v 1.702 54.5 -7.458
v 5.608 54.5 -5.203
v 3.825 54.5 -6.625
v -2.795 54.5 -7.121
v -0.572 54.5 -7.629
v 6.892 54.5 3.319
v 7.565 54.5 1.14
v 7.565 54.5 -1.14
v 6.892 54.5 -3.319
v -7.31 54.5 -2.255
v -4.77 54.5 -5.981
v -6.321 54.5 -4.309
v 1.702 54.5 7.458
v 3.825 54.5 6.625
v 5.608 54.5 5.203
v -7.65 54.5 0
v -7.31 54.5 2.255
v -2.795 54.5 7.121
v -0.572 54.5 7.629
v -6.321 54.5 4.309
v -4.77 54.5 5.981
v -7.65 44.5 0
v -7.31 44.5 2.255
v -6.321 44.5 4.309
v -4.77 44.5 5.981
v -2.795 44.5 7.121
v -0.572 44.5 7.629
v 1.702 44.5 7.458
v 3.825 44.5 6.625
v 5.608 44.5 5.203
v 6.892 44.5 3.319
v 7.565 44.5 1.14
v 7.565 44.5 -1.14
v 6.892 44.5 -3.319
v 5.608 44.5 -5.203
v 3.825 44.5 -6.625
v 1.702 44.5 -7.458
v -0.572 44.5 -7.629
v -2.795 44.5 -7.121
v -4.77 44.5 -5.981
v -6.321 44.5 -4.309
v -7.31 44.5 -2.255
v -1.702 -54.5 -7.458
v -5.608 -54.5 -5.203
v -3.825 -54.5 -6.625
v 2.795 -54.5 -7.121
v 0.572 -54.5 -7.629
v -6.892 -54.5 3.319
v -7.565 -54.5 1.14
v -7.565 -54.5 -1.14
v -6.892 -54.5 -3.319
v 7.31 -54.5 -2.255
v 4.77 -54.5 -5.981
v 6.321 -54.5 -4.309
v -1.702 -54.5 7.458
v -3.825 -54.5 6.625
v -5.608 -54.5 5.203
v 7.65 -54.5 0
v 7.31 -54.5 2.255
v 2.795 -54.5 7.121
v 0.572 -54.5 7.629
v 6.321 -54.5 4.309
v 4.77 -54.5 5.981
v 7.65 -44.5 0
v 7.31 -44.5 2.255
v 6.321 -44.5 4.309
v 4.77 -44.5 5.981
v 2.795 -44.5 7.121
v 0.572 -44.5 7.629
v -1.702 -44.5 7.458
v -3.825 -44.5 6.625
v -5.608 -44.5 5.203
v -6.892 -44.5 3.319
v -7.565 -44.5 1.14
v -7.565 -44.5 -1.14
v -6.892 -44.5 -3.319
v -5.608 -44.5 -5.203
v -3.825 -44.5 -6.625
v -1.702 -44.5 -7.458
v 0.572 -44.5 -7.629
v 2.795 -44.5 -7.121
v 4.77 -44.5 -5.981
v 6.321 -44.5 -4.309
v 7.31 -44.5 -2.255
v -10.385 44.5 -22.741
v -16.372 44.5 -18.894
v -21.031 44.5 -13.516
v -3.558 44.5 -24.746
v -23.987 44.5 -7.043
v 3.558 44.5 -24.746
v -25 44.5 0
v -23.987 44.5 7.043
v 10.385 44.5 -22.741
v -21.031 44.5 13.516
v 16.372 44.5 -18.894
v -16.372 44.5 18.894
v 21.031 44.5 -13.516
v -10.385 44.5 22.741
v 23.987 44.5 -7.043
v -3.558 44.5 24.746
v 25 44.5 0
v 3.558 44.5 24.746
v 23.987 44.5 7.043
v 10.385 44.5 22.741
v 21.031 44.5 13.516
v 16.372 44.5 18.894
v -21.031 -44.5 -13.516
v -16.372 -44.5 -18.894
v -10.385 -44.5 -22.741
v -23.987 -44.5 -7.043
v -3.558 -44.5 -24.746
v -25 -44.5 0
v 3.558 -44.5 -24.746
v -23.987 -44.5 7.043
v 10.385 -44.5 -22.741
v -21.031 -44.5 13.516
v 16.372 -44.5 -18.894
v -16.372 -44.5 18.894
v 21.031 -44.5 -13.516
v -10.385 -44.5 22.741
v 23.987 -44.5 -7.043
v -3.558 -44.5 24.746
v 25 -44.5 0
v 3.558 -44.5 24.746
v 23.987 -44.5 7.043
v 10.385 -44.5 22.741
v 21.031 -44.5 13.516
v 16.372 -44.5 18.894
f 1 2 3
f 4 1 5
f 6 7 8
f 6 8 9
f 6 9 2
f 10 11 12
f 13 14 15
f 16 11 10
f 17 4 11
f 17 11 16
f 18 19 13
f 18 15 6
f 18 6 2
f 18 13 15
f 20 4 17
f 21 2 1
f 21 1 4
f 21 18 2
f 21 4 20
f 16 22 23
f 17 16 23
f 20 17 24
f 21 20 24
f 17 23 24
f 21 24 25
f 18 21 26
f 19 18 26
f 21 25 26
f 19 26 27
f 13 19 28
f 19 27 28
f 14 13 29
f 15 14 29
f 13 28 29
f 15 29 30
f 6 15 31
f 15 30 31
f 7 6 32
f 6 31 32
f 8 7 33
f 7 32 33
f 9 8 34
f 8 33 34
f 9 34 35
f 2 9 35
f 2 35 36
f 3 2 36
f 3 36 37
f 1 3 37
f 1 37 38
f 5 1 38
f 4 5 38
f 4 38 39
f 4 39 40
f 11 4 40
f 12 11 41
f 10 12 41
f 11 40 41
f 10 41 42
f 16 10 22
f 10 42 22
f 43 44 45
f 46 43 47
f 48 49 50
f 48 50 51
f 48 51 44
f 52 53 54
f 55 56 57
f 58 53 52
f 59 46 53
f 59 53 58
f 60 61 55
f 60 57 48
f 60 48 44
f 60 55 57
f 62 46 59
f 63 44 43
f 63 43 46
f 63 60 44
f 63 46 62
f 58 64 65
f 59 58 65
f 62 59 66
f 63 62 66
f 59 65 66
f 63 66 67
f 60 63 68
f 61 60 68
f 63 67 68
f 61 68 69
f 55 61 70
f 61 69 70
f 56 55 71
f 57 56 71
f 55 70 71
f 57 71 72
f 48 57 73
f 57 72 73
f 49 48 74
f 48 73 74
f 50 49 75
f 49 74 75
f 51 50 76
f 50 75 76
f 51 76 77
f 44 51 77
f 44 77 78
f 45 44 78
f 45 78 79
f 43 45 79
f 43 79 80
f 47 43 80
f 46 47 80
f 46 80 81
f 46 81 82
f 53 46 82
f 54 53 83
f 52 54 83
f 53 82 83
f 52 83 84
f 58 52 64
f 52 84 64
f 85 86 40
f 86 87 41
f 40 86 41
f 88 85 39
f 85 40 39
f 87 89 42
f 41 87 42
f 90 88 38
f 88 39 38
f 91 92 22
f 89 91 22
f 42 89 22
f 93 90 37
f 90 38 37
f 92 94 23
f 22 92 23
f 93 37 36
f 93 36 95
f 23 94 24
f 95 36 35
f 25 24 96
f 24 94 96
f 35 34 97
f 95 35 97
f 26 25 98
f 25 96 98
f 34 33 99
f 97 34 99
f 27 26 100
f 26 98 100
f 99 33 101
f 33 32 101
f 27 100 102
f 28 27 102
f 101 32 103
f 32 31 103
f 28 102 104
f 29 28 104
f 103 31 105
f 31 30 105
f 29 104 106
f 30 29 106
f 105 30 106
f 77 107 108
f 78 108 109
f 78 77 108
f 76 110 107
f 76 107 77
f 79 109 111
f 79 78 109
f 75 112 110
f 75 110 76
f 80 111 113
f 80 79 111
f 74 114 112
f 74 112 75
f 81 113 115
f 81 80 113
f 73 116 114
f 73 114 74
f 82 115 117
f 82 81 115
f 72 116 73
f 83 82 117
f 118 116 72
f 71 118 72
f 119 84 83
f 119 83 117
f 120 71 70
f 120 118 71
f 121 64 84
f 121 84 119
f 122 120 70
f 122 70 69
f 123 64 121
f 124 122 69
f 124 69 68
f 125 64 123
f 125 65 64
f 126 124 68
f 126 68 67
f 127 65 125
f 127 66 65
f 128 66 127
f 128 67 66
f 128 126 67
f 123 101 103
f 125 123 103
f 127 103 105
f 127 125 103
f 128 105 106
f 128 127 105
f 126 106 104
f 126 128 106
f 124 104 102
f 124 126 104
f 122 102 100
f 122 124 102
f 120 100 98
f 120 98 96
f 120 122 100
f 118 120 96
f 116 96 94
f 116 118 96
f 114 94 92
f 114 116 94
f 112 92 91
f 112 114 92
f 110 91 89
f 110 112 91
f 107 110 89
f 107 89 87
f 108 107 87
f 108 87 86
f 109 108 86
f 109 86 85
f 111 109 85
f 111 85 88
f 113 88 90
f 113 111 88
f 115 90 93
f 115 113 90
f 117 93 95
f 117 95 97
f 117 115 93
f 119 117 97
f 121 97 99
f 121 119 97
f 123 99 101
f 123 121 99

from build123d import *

# Parameters (mm, degrees)
F0_R     = 25
F1_DEPTH = 44.5
F2_R     = 7.65
F3_DEPTH = 10
F4_R     = 7.65
F5_DEPTH = 10


with BuildPart() as f1:
    # F0 (on Front) → F1 (new body, symmetric)
    with BuildSketch(Plane.XZ):
        Circle(F0_R)
    extrude(amount=F1_DEPTH, both=True)

    # F2 (on face) → F3 (join)
    with BuildSketch(Plane(origin=(0, 44.5, 0), x_dir=(-1, 0, 0), z_dir=(0, 1, 0))):
        Circle(F2_R)
    extrude(amount=F3_DEPTH)

    # F4 (on face) → F5 (join)
    with BuildSketch(Plane.XZ.offset(44.5)):
        Circle(F4_R)
    extrude(amount=F5_DEPTH)


solid = f1.part
